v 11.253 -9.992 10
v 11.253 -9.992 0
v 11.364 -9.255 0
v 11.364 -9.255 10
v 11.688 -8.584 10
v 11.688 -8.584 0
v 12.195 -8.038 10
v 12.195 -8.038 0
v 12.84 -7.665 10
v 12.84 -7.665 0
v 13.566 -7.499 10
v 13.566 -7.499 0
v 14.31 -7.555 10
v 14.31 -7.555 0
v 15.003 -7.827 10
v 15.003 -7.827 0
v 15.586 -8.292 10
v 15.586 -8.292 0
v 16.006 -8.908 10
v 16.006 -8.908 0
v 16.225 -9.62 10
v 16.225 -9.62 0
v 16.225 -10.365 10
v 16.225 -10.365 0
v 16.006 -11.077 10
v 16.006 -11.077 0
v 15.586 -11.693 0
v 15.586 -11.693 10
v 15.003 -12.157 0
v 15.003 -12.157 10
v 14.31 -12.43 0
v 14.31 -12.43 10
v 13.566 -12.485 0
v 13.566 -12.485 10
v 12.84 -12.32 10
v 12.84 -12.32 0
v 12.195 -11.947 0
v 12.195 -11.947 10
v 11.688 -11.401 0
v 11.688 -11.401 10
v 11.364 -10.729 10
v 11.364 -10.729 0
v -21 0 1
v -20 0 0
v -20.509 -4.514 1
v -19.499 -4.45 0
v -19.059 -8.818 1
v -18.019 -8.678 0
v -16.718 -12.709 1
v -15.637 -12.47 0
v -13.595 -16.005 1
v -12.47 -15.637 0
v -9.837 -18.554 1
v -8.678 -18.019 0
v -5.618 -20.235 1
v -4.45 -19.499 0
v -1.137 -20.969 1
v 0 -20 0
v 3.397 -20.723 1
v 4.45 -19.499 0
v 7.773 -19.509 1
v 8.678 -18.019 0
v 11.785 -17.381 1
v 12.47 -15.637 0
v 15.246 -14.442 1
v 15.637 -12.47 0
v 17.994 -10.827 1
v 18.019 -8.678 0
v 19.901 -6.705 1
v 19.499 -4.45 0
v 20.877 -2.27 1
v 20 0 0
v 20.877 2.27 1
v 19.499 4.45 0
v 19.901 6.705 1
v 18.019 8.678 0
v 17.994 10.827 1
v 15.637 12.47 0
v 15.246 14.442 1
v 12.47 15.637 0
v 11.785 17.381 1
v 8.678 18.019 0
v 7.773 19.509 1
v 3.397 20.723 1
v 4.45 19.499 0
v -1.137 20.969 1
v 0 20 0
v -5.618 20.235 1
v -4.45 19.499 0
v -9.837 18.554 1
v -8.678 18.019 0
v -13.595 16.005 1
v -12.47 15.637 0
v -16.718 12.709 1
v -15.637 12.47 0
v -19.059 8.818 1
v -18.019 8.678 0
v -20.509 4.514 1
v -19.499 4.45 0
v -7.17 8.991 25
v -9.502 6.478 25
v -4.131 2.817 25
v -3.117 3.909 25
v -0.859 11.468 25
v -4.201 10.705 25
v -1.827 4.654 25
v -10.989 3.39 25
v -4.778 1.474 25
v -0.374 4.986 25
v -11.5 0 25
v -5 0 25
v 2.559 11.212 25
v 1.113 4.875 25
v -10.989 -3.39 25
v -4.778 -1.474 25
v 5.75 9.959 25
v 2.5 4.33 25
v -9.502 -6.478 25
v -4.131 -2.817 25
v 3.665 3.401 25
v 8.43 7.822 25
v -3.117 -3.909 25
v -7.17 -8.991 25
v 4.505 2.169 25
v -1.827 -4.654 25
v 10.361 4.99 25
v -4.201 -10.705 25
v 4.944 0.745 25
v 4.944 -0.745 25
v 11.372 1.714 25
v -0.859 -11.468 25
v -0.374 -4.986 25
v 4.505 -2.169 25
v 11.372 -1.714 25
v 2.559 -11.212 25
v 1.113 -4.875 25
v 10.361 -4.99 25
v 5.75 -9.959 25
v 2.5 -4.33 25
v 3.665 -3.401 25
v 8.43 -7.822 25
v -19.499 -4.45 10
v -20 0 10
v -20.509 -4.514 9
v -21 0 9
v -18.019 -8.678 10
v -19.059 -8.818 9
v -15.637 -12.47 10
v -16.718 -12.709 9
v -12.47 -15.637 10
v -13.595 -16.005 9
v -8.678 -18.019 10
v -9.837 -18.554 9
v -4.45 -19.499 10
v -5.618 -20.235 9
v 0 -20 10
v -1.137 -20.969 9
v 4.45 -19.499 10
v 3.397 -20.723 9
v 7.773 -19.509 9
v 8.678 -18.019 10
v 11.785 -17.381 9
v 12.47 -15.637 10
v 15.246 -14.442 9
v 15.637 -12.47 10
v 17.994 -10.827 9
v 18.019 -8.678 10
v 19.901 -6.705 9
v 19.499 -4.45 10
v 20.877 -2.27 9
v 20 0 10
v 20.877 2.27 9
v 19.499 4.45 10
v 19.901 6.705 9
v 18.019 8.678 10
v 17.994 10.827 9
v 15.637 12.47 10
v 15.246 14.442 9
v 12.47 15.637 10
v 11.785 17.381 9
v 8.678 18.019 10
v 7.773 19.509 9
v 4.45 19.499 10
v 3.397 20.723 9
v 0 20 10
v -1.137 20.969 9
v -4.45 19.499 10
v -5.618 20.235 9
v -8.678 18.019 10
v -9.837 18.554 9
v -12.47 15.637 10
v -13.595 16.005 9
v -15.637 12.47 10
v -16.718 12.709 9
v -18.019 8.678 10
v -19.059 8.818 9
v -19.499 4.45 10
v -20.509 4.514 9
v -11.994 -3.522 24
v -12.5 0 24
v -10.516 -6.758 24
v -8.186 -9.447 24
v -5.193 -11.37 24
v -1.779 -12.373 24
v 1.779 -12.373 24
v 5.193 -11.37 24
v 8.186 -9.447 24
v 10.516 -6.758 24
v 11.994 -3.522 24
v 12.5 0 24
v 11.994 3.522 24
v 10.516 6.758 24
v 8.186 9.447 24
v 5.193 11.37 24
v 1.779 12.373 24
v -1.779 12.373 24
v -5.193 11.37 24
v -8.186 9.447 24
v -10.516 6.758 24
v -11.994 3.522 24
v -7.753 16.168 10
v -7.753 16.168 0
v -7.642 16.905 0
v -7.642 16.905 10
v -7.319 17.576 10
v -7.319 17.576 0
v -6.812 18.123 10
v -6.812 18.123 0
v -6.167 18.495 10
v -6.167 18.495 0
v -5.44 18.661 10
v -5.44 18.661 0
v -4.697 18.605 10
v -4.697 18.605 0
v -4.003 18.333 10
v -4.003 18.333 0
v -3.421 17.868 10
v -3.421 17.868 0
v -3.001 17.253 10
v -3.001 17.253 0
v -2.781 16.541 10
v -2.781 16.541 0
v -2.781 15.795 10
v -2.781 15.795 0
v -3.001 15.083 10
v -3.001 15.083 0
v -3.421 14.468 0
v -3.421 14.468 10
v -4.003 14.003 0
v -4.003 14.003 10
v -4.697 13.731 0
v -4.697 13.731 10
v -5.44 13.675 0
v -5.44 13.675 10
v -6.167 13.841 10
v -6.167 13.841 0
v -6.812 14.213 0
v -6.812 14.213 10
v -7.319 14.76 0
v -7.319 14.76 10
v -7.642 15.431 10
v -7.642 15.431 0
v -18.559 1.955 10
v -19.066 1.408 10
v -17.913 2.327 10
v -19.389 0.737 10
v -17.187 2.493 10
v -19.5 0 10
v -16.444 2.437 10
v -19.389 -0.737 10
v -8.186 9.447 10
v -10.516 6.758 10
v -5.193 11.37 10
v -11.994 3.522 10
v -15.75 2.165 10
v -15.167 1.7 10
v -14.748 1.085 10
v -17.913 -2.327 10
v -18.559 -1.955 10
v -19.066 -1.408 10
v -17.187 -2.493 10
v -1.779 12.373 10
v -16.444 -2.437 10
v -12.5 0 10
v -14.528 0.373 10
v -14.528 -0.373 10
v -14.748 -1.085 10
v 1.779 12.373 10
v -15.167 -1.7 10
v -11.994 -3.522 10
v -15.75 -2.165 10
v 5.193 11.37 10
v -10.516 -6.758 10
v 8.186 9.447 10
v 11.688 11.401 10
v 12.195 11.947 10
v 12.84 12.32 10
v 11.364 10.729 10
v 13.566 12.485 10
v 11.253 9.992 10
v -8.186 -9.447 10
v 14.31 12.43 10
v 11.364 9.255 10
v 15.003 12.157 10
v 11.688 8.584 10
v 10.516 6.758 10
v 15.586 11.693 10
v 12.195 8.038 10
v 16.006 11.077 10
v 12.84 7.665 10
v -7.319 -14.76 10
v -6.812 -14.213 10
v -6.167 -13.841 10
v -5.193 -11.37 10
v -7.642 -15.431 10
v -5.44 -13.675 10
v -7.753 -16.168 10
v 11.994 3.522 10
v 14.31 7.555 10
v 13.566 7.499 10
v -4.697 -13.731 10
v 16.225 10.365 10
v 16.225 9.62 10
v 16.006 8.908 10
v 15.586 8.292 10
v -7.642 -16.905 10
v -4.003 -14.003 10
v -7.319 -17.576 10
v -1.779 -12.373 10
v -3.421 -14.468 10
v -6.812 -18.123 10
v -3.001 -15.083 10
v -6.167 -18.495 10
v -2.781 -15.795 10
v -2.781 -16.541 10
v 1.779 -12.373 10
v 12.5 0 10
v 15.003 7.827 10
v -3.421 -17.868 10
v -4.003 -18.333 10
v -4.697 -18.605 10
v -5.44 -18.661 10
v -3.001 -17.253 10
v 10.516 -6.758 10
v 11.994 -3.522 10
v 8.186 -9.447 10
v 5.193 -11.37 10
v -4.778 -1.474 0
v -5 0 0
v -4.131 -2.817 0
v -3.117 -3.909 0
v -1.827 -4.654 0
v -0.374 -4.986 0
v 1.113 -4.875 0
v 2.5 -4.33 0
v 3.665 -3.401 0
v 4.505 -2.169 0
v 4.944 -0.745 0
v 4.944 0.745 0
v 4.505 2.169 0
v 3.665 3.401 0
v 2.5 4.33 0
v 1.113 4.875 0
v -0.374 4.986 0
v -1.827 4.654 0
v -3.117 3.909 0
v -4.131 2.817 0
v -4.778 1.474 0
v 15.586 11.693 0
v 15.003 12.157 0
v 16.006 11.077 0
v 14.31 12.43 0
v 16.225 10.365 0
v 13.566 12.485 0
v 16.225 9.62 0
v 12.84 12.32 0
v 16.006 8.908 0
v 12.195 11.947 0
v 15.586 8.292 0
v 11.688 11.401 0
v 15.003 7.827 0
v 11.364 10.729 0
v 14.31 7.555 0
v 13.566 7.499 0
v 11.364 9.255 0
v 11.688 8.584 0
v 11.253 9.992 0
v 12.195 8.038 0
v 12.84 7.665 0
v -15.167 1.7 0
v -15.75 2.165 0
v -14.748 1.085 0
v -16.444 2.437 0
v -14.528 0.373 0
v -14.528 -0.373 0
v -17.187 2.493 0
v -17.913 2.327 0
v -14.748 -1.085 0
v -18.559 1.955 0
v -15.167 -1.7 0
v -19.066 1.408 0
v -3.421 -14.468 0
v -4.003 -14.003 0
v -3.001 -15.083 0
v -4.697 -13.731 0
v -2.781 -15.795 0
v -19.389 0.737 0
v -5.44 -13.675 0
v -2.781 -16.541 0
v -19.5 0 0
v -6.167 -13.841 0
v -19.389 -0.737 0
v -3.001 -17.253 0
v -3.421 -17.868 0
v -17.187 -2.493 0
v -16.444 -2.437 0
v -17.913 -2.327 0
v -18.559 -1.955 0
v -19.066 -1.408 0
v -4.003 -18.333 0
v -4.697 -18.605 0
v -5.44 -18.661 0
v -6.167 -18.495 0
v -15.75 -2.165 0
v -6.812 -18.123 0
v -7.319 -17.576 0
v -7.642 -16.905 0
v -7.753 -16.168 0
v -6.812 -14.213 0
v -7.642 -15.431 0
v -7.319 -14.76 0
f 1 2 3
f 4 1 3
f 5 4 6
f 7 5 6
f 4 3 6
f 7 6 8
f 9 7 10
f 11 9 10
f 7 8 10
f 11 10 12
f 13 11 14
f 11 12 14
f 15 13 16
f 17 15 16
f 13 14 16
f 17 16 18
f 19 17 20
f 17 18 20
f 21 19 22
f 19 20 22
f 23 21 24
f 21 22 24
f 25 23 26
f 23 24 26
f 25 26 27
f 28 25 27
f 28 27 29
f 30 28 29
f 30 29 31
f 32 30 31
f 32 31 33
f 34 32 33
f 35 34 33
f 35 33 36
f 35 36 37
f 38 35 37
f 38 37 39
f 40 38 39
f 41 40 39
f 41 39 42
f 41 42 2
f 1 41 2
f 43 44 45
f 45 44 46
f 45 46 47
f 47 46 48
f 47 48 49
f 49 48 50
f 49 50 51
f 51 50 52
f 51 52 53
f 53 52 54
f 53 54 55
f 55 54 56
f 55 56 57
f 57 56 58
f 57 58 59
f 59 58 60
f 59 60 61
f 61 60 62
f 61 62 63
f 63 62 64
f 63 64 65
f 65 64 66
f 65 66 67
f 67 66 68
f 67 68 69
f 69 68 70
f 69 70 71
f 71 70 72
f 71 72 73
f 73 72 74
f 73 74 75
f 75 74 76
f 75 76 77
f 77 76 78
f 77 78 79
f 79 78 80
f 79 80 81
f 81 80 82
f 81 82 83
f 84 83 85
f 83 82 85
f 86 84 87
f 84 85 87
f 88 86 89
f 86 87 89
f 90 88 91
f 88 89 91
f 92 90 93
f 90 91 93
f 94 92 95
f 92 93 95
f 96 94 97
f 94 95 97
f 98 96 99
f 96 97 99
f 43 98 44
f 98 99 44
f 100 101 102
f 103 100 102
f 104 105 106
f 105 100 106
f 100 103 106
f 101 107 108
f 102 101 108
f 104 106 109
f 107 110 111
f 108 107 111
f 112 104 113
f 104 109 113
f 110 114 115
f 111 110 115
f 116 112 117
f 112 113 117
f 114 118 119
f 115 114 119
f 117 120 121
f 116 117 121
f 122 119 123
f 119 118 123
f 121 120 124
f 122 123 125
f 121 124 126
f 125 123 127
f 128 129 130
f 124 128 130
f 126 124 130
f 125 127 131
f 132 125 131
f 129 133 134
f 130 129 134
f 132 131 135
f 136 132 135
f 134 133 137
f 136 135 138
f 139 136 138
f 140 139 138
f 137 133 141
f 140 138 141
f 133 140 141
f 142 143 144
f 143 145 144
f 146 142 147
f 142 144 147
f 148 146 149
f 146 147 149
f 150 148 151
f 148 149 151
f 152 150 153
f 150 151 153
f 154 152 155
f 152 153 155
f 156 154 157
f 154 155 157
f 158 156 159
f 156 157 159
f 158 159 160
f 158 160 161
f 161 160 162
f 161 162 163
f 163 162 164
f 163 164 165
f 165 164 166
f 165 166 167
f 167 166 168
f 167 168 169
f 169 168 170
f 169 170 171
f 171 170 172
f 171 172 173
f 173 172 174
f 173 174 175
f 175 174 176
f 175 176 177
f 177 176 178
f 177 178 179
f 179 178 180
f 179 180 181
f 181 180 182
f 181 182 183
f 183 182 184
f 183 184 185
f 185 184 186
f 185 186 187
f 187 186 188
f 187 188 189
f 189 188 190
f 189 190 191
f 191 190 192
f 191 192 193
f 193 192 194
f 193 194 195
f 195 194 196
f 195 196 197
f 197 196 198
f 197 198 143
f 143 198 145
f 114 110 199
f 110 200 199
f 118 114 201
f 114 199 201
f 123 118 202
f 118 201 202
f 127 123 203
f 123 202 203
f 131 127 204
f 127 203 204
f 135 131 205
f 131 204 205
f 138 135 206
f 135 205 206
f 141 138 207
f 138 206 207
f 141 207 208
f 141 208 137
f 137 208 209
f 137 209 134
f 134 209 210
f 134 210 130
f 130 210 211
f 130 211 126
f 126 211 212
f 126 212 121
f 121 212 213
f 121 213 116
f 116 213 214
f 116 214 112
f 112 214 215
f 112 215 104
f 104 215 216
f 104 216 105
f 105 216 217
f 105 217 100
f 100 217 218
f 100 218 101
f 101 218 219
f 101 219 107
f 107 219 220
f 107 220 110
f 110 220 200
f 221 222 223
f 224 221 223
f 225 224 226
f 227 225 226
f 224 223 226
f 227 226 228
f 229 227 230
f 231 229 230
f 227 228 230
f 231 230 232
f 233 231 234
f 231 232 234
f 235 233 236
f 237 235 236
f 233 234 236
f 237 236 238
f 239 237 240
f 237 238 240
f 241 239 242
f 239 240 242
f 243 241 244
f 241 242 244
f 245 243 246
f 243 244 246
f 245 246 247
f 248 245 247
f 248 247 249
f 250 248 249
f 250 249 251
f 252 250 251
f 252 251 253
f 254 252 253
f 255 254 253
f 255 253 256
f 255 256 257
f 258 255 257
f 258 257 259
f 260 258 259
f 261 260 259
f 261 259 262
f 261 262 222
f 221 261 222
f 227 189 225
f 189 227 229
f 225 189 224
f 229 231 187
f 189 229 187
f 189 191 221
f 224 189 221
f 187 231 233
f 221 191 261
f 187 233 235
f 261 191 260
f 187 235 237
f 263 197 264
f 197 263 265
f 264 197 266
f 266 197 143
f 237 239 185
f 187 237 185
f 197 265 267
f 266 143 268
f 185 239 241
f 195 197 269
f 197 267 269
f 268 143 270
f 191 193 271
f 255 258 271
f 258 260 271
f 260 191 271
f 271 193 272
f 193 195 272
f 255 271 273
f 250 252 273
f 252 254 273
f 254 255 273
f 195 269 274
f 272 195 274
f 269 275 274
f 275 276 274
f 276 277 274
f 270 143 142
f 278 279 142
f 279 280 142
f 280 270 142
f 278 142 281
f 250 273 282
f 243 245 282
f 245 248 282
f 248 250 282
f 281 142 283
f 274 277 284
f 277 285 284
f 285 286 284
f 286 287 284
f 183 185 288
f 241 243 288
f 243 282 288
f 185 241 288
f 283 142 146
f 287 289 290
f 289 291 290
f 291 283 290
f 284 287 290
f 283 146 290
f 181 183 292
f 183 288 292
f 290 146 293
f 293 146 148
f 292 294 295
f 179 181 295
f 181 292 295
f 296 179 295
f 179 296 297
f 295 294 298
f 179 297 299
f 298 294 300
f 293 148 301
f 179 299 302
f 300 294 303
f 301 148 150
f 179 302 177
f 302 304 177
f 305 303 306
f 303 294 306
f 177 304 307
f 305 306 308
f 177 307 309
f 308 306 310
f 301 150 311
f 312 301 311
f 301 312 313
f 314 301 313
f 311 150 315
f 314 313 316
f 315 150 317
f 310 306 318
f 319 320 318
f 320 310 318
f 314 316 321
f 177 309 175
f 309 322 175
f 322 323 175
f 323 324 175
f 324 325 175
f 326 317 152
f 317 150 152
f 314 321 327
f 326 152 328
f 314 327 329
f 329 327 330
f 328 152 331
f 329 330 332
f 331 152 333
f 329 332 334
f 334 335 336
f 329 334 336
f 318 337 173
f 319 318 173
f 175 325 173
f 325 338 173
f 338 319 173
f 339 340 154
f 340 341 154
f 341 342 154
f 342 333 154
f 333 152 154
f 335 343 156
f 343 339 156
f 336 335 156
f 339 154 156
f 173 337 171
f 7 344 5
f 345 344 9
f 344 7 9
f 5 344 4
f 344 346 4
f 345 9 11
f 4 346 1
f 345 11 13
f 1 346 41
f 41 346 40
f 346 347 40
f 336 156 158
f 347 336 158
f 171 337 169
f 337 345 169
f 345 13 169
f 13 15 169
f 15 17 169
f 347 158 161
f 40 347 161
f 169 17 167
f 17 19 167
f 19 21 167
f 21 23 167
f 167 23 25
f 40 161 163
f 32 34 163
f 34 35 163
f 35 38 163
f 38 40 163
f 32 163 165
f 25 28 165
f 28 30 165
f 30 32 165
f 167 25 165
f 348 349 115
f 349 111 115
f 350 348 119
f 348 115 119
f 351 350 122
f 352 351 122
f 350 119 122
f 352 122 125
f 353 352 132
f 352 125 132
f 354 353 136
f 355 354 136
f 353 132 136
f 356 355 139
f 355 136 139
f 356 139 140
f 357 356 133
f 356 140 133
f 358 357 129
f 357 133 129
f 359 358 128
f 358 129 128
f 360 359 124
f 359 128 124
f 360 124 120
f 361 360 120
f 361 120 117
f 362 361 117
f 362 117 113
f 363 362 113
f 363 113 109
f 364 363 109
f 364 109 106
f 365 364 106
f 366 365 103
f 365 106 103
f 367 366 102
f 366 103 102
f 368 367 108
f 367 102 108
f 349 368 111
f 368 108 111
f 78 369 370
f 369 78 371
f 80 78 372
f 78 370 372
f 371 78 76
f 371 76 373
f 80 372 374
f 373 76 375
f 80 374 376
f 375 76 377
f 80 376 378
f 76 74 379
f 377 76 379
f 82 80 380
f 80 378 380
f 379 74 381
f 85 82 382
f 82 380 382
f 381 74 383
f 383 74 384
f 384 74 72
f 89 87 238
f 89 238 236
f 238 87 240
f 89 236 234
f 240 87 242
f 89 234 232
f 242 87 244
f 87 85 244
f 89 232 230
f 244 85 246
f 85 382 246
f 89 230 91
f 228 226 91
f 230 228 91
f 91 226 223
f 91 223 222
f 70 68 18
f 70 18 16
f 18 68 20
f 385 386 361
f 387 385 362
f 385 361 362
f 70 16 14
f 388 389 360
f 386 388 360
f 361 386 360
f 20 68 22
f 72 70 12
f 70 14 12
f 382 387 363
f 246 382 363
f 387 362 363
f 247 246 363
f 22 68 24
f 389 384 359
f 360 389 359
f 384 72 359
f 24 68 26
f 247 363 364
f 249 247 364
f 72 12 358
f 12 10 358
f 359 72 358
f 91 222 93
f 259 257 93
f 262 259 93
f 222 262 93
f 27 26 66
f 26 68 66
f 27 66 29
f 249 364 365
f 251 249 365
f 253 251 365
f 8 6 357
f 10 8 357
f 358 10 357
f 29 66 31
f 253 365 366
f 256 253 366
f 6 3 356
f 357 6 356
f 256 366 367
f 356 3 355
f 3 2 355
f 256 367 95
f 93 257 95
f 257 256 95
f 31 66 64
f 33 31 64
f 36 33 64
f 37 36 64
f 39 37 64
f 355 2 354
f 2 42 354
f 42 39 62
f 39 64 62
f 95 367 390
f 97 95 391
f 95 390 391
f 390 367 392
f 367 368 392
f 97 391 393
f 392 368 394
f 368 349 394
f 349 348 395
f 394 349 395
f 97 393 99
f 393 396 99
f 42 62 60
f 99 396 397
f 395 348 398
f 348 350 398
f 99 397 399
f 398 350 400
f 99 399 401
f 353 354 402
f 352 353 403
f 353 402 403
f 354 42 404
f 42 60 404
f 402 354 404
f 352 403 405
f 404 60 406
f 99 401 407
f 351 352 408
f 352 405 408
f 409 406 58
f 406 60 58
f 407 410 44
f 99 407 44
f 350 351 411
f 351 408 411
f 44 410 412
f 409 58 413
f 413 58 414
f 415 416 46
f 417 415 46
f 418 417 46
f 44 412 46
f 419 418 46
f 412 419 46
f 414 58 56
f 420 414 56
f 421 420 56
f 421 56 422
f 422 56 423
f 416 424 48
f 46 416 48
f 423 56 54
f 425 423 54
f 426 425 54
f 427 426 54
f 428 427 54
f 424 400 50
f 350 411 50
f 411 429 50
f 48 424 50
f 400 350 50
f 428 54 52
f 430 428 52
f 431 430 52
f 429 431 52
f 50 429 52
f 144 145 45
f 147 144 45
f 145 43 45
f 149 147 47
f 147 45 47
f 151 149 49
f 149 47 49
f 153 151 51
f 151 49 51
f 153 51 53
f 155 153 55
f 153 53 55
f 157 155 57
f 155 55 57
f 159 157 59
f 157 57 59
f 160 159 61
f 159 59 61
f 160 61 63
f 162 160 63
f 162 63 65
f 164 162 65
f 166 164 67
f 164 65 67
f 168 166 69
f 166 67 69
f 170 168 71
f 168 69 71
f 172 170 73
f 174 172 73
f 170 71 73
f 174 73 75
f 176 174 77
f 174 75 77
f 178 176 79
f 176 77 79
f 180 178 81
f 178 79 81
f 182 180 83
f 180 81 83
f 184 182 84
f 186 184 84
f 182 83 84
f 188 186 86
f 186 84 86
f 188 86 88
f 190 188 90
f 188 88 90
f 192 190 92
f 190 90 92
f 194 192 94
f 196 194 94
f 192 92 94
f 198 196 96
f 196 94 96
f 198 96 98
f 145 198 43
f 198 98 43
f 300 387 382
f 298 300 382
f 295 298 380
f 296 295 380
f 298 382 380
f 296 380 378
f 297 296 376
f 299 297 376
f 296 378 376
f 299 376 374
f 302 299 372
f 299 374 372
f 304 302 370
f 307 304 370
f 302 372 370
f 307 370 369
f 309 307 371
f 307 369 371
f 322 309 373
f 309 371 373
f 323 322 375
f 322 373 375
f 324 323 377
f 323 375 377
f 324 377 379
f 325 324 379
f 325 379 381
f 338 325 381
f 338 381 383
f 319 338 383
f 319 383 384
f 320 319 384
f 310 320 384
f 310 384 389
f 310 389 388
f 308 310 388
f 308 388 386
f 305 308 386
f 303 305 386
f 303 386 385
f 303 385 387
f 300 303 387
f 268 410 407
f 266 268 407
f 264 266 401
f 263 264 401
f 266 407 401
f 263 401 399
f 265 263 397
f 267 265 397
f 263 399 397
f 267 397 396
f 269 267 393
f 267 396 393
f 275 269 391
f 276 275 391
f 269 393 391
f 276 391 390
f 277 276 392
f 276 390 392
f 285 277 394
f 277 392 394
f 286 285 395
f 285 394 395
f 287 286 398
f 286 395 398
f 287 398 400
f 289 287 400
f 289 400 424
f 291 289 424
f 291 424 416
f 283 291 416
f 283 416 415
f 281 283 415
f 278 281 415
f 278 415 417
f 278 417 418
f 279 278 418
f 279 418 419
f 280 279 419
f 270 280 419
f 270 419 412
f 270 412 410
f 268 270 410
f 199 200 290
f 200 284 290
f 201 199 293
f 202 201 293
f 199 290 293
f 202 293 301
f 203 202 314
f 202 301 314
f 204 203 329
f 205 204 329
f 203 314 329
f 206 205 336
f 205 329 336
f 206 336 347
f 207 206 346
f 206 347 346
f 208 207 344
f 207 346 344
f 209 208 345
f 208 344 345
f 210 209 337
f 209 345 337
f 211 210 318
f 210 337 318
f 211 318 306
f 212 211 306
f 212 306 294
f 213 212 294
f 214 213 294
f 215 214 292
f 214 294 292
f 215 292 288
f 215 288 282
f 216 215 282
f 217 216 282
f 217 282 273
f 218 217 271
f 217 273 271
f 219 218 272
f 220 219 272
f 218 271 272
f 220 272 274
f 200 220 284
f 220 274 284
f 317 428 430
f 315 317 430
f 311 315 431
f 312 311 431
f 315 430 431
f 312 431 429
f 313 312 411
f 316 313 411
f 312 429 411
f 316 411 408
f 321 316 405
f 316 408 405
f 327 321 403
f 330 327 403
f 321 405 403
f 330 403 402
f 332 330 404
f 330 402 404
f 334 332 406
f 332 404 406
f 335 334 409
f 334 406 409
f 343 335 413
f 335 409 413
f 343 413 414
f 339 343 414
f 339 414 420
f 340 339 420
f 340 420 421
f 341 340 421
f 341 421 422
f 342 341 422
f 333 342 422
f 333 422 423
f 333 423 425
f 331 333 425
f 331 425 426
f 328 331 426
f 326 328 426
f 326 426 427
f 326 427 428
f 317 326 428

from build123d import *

# Parameters (mm, degrees)
F3_D     = 5
F3_DEPTH = 20


with BuildPart() as f1:
    # F0 (on Front) → F1 (revolve)
    with BuildSketch(Plane.XZ):
        Polygon((-5, 0), (-5, 25), (-11.5, 25), (-12.5, 24), (-12.5, 16), (-12.5, 10), (-20, 10), (-21, 9), (-21, 1), (-20, 0), align=None)
    revolve(axis=Axis((0, 0, 12.5), (0, 0, 1)))

    # F3
    with Locations(Plane.XY.offset(10)):
        with Locations((-17, 0), (-5.253289, 16.167961), (13.753289, 9.992349), (13.753289, -9.992349), (-5.253289, -16.167961)):
            Hole(F3_D / 2, depth=F3_DEPTH)


solid = f1.part
